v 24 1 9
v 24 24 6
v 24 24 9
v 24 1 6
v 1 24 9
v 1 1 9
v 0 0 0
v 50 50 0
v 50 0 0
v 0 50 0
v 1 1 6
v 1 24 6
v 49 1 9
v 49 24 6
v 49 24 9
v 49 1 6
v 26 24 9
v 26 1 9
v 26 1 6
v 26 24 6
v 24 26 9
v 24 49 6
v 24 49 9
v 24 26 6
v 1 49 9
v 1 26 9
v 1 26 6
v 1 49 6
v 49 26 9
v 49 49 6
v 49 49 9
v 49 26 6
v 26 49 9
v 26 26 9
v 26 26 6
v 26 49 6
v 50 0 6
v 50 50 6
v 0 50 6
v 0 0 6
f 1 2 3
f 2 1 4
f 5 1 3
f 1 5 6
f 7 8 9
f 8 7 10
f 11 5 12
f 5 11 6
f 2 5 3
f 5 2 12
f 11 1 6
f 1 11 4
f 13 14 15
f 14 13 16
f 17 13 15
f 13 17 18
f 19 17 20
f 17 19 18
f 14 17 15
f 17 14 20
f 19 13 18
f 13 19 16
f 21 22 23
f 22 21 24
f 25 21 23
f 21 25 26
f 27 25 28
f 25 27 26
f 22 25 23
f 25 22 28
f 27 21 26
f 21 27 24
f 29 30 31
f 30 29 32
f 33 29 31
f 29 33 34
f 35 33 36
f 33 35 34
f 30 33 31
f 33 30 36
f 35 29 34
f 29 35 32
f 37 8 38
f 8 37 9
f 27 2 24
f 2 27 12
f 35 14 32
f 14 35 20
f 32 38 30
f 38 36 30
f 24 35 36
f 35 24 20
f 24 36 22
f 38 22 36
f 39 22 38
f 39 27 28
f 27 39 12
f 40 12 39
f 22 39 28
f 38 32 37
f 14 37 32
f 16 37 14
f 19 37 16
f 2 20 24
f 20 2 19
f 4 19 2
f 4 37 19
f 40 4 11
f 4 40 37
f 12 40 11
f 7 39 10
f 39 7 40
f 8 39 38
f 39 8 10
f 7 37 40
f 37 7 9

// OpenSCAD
//translate([0,0,0]) color("LightGray") square([25,25],false);
//translate([25,0,0]) color("LightGray") square([25,25],false);
//translate([0,25,0]) color("LightGray") square([25,25],false);
//translate([25,25,0]) color("LightGray") square([25,25],false);

scale([2,2,2]) {
    //translate([0,50,0]) color("Gray") square([50,12.5],false);
    //translate([50,0,0]) color("Gray") square([12.5,50],false);
}

color("LightGray") {
    translate([1,1,0]) cube([23,23,9]);
    translate([25+1,1,0]) cube([23,23,9]);
    translate([1,25+1,0]) cube([23,23,9]);
    translate([25+1,25+1,0]) cube([23,23,9]);
}
color("Grey") {
    cube([50,50,6]);
//    translate([0,50-10.2,0]) cube([50,10.2,50]);
//    translate([50-10.2,0,0]) cube([10.2,50,50]);
}
